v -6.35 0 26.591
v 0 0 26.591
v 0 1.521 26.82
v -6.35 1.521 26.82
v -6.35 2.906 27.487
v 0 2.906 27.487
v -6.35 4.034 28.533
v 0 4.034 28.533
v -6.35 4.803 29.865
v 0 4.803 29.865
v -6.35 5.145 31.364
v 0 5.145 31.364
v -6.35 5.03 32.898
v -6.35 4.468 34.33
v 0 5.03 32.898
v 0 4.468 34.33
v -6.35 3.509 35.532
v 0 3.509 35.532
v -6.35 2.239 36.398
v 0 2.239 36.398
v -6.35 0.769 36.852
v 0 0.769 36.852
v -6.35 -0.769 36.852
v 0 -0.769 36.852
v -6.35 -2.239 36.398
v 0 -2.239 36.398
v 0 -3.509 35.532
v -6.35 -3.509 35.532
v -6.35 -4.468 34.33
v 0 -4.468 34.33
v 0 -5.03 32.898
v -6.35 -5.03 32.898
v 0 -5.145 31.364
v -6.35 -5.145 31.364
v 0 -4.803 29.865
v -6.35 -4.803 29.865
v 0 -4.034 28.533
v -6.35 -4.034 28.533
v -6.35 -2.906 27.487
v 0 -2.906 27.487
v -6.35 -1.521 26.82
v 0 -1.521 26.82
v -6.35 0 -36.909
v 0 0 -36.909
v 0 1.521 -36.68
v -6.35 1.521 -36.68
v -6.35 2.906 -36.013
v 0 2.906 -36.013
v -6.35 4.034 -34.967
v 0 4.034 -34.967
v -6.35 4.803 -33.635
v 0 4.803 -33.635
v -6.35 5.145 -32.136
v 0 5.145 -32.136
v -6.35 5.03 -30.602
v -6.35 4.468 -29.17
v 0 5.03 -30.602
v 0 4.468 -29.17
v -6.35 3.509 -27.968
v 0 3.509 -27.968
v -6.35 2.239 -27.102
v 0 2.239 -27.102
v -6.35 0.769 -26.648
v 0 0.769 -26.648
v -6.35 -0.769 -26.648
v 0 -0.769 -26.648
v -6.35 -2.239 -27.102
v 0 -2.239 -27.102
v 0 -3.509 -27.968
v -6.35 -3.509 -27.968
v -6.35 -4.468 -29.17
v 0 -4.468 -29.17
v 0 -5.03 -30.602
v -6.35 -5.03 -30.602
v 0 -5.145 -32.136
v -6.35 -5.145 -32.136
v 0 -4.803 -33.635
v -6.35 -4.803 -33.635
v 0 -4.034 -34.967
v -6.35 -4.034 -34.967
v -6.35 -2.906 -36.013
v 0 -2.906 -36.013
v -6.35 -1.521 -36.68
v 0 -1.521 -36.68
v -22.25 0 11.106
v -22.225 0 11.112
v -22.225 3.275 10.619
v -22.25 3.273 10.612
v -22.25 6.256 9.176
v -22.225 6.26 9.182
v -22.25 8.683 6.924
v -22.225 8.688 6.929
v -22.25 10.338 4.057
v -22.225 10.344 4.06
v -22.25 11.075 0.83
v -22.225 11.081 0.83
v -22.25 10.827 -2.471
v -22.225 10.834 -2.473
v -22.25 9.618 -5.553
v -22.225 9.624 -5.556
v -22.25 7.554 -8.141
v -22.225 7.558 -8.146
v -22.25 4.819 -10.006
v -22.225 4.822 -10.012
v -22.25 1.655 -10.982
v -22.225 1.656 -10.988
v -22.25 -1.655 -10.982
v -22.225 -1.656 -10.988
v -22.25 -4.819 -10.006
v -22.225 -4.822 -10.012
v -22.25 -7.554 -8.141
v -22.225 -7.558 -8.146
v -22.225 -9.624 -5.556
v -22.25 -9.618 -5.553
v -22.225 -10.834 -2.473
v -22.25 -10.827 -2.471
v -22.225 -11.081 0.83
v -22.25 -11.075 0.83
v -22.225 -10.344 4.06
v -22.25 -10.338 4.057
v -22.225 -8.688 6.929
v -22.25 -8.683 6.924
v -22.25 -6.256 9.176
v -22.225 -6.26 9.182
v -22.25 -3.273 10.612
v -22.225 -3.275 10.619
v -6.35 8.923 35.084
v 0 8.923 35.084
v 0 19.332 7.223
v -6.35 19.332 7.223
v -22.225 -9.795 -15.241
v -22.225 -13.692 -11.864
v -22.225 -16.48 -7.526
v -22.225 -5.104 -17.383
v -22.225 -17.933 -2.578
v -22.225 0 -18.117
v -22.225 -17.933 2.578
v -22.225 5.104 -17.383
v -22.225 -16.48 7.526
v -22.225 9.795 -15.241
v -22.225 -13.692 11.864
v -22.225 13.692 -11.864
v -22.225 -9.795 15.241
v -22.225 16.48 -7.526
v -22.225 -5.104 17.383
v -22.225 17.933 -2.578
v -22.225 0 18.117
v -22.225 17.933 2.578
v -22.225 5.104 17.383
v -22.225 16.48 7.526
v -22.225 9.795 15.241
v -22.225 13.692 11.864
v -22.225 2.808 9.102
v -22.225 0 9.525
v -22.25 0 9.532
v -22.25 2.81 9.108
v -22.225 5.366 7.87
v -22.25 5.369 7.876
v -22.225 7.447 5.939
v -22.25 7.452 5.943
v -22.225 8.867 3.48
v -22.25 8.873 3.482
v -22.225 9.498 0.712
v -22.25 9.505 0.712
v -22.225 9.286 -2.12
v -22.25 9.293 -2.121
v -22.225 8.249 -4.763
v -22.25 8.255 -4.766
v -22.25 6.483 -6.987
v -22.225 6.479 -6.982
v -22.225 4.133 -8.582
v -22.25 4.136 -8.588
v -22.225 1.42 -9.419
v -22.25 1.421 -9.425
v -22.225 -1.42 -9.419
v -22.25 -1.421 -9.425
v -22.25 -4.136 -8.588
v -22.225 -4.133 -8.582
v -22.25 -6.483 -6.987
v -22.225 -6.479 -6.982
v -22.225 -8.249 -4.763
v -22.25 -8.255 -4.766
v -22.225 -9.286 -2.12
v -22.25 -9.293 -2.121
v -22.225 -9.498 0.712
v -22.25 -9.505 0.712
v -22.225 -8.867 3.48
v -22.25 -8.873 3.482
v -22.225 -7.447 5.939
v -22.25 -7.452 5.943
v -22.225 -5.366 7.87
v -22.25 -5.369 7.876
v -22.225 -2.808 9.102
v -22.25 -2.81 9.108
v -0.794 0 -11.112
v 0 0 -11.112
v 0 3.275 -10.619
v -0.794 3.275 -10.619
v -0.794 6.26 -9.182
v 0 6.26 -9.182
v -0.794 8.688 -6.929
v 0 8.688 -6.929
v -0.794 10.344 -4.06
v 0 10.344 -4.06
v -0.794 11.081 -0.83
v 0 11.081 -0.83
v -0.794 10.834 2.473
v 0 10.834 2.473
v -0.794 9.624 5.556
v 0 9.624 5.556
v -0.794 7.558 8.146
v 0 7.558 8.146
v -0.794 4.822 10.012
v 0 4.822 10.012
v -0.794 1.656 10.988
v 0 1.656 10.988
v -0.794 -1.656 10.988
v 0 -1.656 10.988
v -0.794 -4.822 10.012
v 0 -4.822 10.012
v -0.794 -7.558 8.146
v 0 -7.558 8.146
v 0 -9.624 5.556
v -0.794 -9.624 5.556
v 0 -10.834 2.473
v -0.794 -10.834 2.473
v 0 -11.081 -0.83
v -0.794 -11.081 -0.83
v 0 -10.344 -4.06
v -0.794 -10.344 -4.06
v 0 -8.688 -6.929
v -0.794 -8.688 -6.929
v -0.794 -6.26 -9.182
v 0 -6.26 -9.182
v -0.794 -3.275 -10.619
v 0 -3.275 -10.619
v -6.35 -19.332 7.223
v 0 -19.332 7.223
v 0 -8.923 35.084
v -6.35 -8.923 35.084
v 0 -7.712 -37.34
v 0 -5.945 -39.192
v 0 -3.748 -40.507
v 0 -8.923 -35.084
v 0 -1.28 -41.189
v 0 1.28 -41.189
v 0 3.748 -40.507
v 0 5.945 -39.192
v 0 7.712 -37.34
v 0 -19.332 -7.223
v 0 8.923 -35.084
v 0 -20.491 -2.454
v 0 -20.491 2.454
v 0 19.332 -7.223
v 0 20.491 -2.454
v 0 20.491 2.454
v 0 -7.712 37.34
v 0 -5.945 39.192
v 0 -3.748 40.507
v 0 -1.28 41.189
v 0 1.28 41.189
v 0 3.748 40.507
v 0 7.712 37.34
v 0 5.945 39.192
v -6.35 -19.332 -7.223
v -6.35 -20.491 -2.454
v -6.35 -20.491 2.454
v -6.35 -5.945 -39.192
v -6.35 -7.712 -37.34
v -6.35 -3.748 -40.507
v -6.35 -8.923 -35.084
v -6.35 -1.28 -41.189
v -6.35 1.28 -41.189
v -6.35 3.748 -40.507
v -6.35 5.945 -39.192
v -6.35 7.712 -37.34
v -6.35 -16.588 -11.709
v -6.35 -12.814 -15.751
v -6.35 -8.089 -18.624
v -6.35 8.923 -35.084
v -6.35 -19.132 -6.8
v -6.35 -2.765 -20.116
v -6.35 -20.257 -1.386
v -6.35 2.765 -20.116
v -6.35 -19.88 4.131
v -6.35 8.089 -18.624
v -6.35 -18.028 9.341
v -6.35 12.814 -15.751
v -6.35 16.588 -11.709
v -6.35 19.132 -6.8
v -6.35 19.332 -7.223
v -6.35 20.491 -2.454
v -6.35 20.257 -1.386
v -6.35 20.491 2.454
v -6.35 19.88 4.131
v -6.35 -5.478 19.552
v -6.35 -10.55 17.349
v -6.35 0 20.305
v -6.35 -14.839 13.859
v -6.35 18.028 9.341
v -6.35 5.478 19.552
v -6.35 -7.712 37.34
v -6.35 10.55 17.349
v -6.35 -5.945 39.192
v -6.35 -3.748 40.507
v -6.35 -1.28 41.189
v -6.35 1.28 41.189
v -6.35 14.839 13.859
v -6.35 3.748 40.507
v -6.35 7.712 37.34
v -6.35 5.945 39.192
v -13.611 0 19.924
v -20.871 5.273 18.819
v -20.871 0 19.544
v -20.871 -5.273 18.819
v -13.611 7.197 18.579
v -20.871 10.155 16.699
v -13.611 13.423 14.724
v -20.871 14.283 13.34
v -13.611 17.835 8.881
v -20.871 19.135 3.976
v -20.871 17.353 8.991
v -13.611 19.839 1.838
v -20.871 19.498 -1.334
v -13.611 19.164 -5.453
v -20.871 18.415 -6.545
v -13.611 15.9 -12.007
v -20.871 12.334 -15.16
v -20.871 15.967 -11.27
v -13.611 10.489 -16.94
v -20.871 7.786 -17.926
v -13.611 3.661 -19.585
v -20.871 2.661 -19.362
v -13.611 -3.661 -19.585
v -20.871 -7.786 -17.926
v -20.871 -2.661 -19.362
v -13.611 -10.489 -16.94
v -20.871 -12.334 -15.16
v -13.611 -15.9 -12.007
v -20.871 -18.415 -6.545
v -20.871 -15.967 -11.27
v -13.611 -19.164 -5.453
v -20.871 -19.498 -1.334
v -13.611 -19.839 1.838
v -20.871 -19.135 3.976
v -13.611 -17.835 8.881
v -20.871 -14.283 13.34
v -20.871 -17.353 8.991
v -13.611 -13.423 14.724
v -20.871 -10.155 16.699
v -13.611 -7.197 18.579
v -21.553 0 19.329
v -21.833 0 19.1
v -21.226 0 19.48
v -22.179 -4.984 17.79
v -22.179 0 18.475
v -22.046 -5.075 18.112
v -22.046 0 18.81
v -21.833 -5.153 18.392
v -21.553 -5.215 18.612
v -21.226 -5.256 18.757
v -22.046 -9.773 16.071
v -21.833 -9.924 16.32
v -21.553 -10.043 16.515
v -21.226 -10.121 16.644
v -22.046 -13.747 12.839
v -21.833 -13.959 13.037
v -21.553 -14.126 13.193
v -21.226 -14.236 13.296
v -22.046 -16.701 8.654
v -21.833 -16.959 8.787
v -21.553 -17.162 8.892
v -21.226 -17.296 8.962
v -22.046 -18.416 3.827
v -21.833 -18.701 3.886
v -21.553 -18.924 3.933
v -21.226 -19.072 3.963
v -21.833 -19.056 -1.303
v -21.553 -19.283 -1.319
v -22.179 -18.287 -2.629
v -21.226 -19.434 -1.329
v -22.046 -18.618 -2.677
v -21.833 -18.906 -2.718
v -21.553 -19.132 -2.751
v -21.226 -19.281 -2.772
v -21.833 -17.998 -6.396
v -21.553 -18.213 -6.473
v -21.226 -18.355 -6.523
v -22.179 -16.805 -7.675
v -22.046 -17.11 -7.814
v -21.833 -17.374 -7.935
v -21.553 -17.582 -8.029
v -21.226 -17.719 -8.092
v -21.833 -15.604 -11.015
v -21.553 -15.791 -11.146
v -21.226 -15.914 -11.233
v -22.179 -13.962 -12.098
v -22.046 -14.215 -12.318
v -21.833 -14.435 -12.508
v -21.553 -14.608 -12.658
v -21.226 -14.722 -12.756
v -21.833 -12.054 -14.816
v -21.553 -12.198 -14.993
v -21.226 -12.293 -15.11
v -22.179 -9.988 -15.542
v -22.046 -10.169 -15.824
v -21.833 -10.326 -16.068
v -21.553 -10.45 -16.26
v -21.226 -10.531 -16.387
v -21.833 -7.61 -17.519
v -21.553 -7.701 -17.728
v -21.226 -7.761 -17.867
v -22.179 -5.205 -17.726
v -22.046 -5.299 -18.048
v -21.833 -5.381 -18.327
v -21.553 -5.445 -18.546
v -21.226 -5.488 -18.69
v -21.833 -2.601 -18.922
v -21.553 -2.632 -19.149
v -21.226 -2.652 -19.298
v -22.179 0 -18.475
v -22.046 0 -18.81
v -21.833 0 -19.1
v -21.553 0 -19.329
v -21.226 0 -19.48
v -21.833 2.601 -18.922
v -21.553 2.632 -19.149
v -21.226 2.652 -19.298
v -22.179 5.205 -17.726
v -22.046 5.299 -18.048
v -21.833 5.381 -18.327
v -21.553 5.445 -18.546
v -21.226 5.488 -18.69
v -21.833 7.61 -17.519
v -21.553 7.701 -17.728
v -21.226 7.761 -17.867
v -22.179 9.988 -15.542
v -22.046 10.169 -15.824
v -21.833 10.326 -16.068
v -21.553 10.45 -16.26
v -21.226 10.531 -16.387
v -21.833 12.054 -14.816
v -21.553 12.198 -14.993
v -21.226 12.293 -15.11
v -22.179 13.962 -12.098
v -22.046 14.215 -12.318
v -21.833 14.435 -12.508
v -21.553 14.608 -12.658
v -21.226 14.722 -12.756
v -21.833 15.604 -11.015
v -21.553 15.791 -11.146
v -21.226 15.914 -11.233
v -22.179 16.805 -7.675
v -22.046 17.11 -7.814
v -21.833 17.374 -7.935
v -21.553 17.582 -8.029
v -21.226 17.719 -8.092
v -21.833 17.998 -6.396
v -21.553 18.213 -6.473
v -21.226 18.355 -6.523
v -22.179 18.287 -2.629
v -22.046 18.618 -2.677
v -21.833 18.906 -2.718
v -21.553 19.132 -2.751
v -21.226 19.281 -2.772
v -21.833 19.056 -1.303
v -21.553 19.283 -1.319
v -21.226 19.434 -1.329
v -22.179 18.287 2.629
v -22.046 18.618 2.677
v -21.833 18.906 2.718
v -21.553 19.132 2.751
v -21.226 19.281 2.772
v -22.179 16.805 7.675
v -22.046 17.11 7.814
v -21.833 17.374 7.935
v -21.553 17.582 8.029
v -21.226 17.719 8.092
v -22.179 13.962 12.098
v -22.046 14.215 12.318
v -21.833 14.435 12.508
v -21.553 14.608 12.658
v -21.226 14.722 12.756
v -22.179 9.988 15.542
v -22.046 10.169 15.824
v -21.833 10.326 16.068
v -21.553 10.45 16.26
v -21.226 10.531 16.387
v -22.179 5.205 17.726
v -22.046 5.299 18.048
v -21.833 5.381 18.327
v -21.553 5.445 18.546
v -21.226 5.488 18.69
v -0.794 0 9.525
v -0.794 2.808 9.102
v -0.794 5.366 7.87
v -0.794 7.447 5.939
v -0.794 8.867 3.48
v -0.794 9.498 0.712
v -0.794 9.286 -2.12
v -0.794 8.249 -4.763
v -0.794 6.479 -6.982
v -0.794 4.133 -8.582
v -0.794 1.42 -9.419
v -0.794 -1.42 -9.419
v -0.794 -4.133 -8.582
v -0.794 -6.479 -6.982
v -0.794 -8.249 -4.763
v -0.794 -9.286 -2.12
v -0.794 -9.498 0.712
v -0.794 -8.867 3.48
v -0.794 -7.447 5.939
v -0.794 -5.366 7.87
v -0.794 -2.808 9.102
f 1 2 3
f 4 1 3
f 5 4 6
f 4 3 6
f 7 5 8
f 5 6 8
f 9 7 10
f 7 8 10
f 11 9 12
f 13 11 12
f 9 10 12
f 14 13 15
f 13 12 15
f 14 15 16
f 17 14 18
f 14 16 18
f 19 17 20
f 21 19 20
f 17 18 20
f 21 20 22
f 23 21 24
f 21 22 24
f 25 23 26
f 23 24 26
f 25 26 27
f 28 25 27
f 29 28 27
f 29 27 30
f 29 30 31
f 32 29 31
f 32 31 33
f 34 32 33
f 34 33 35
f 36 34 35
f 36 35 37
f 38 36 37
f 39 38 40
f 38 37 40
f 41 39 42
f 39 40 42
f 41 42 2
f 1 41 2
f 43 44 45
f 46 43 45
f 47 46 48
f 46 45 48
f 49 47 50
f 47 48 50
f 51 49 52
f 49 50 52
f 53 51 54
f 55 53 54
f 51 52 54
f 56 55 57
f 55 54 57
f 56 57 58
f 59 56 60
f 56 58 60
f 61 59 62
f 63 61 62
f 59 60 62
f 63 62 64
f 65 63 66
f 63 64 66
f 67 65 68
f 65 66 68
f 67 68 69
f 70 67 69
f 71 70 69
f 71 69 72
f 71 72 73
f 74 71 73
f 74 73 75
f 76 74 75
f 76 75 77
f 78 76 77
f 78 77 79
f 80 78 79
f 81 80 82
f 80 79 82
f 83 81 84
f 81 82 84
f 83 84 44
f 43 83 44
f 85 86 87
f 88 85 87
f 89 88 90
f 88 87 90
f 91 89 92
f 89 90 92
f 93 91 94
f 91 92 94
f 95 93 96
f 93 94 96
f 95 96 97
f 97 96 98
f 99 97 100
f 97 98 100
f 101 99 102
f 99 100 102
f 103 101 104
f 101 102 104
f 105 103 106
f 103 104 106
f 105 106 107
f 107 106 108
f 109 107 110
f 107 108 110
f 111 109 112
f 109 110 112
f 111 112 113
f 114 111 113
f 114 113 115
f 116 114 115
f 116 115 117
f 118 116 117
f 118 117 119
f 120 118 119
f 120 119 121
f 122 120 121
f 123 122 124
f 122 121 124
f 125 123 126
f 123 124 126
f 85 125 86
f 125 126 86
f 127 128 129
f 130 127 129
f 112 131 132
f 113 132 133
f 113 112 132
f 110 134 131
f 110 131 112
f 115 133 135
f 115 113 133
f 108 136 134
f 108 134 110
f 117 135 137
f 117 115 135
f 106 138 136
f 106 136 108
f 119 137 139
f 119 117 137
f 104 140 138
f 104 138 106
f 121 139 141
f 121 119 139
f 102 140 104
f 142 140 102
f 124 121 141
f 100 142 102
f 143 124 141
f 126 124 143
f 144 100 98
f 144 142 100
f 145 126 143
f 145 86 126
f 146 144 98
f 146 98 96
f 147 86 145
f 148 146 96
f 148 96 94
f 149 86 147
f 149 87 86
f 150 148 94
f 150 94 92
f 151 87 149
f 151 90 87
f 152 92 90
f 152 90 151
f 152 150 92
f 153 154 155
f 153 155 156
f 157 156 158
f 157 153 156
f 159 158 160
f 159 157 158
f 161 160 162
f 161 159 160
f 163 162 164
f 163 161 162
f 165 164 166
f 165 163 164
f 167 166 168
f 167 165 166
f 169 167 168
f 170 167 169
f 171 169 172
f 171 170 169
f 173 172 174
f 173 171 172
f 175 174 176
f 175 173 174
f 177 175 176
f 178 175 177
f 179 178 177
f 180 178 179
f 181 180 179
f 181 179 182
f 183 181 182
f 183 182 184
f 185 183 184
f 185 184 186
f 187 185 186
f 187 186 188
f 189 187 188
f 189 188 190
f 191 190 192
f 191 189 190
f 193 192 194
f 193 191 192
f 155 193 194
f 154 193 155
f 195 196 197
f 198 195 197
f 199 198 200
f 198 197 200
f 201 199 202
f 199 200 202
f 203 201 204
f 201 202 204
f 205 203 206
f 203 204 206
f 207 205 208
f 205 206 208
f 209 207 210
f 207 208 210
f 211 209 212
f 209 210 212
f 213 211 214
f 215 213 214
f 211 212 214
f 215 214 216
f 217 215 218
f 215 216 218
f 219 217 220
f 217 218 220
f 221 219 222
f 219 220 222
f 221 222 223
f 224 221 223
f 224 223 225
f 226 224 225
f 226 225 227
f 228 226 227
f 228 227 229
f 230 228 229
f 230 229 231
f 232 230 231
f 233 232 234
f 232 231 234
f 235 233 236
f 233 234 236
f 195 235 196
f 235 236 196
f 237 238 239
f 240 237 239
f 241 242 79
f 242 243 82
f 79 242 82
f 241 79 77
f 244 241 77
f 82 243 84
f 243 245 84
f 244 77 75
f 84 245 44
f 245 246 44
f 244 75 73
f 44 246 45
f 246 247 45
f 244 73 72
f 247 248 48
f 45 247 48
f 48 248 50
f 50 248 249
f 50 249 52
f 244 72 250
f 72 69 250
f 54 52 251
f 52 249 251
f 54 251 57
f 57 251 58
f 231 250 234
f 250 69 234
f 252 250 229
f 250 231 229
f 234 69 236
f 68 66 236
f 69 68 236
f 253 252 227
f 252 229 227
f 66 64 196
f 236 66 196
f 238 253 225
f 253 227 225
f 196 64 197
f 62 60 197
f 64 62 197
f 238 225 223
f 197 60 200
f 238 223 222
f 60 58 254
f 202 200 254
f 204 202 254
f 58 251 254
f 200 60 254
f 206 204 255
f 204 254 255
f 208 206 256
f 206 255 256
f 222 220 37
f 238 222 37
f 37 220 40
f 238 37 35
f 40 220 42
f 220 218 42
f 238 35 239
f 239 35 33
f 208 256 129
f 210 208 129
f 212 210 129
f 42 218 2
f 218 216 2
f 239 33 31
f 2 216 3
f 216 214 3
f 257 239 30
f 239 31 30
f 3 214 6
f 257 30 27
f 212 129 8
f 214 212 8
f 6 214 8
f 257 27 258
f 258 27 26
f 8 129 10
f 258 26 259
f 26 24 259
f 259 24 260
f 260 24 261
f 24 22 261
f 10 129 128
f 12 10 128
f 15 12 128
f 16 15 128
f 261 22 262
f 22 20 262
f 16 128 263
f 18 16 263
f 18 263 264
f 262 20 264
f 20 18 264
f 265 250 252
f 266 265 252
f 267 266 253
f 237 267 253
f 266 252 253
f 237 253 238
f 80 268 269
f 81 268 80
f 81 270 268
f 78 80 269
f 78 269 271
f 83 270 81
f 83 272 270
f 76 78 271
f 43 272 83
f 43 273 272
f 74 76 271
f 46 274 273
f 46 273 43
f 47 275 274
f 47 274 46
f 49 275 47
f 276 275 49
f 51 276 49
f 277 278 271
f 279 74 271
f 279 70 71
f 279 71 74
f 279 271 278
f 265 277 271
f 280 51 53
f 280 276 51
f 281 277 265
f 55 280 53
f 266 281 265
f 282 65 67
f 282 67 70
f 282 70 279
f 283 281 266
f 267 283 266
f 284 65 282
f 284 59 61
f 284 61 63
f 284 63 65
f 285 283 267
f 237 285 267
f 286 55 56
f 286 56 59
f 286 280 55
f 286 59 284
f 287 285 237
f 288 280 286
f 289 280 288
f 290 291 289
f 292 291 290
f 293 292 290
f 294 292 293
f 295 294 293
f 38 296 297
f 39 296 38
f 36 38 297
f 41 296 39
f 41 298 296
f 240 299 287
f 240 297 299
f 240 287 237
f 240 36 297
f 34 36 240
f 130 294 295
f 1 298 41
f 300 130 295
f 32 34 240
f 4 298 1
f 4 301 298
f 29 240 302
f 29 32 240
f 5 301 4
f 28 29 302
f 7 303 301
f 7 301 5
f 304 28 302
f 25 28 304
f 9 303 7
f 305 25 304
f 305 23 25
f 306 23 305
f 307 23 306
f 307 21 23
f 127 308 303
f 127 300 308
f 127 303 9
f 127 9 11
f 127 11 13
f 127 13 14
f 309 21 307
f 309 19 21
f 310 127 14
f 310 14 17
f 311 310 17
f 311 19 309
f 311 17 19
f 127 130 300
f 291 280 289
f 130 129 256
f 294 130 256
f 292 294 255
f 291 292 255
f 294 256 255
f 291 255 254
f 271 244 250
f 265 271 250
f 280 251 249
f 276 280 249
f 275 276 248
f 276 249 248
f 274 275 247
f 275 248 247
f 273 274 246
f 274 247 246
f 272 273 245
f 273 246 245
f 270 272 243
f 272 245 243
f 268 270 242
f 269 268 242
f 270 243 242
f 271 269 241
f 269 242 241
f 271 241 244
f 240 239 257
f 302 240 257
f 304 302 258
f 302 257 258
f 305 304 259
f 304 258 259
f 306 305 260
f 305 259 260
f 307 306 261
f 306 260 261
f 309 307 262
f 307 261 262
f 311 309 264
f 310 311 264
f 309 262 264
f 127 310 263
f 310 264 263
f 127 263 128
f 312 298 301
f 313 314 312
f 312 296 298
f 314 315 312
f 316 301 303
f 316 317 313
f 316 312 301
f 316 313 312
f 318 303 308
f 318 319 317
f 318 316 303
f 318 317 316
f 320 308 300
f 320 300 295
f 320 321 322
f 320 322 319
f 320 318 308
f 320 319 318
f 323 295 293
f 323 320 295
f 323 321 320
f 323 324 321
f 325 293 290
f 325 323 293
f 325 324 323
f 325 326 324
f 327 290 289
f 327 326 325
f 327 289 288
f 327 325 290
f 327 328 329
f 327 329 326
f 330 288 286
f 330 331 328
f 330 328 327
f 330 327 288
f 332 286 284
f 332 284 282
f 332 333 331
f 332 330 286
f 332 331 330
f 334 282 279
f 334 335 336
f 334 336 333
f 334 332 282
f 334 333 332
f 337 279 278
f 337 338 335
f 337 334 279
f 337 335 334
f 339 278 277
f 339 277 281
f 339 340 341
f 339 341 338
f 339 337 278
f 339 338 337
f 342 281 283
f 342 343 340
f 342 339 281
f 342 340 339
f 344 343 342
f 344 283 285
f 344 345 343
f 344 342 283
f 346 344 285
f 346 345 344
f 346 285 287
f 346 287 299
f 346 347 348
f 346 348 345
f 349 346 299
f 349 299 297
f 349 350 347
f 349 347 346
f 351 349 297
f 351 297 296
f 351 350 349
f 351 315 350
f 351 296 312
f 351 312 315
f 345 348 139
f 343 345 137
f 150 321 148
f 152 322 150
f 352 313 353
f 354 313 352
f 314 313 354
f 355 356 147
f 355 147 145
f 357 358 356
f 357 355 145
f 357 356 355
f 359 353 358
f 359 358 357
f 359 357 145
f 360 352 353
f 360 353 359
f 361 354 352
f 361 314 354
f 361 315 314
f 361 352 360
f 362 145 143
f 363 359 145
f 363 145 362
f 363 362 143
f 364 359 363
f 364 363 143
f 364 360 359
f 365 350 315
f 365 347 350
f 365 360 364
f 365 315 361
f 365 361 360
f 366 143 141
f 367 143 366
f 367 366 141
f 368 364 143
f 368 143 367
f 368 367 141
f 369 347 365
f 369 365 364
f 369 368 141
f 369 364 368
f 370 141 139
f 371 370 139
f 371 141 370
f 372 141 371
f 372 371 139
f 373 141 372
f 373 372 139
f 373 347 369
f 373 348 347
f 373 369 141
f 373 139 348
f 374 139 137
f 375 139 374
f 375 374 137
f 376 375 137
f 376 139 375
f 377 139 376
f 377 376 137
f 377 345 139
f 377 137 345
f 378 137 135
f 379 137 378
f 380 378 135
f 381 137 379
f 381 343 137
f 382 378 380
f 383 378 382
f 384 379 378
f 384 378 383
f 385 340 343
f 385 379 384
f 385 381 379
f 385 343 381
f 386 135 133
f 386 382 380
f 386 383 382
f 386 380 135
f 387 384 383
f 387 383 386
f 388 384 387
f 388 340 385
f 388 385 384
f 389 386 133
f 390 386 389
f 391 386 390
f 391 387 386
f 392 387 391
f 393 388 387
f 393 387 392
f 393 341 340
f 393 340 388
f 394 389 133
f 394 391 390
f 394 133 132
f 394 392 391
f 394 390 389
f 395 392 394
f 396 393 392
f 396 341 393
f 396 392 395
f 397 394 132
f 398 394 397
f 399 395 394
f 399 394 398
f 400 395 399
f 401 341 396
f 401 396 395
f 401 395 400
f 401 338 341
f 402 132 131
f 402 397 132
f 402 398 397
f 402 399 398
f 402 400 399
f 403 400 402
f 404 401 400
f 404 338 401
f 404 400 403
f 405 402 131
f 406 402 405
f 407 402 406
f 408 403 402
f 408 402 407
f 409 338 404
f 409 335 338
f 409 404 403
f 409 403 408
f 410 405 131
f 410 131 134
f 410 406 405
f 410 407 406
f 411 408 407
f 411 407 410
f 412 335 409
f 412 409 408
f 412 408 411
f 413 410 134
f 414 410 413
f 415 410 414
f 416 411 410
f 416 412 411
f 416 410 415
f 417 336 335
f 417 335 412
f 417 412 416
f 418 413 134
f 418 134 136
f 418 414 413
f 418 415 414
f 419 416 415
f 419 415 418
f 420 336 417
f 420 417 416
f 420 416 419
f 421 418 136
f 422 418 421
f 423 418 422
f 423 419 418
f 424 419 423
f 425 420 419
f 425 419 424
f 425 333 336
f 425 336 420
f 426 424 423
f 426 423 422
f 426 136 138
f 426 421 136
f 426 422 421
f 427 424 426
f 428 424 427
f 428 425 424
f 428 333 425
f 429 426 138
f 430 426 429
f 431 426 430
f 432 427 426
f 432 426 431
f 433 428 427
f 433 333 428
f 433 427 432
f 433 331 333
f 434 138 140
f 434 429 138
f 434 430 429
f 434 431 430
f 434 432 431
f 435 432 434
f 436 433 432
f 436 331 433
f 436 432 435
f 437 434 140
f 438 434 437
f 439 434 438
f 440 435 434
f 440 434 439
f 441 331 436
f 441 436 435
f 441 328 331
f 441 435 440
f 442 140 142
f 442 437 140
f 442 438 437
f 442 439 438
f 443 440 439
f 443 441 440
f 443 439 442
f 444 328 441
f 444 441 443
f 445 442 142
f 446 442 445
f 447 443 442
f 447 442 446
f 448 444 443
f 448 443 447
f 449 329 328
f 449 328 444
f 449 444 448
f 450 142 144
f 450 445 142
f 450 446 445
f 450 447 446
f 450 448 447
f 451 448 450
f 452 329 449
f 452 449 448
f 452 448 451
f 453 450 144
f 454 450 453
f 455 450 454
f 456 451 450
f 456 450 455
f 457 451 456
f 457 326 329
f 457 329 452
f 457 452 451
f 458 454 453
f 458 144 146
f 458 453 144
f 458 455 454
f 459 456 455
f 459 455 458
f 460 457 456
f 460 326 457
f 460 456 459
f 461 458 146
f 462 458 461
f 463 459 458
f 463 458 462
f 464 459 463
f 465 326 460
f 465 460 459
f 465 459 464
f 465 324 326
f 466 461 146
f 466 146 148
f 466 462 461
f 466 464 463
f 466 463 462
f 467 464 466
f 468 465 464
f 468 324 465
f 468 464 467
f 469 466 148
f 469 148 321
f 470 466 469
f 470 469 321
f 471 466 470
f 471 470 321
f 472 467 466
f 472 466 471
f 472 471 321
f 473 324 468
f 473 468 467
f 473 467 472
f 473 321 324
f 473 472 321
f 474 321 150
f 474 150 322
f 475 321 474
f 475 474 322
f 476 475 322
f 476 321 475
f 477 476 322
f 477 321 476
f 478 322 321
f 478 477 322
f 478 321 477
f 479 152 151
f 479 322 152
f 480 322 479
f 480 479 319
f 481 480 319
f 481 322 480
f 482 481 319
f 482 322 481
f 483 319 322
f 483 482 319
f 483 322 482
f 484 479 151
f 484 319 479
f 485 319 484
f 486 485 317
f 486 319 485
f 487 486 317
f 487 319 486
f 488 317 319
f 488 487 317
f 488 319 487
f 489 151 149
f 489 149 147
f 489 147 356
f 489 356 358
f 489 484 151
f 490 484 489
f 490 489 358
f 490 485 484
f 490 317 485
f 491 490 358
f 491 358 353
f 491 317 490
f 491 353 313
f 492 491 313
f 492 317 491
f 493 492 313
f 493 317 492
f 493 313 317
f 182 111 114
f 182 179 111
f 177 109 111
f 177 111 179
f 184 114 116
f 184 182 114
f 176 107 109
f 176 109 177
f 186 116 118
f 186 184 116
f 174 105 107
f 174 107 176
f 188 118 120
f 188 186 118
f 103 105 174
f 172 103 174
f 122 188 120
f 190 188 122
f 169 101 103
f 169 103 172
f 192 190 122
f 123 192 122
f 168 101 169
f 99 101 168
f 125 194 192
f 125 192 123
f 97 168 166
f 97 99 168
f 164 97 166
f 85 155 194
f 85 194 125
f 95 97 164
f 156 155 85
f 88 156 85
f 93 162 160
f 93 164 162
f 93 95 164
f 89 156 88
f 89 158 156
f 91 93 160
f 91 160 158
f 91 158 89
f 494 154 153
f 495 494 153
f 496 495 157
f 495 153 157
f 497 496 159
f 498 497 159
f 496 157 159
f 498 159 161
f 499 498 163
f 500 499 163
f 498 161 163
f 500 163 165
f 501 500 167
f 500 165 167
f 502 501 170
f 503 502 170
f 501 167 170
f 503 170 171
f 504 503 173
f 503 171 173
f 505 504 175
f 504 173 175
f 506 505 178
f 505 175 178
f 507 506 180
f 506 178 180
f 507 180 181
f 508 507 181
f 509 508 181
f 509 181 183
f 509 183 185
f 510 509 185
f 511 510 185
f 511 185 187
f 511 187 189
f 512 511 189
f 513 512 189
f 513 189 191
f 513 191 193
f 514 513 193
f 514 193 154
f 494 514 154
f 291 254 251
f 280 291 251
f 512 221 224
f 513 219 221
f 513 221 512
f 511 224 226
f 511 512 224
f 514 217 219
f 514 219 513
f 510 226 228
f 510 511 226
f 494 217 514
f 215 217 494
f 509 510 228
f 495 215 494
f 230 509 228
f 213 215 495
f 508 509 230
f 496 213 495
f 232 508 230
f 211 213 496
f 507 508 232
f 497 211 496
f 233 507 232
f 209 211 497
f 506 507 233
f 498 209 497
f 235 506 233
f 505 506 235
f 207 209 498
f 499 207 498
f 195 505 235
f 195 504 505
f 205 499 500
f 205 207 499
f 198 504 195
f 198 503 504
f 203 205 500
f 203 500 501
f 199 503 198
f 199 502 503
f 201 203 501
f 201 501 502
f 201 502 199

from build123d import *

# Parameters (mm, degrees)
SKETCH1_R           = 5.159375
BASE_EXTRUDE_DEPTH  = 6.35
SKETCH2_R           = 20.6375
BOSS_EXTRUDE1_DEPTH = 22.225
BOSS_EXTRUDE1_TAPER = 3
SKETCH3_R           = 9.525
CUT_EXTRUDE1_DEPTH  = 52.219943931
SKETCH4_R           = 11.1125
SKETCH4_R_2         = 9.525
BOSS_EXTRUDE2_DEPTH = 0.0254
BOSS_EXTRUDE2_DRAFT = 15
SKETCH5_R           = 11.1125
CUT_EXTRUDE2_DEPTH  = 0.79375
FILLET1_R           = 1.42875


with BuildPart() as part:
    # Sketch1 → Base-Extrude (new body)
    with BuildSketch(Plane(origin=(0, 0, 0), x_dir=(0, 0, -1), z_dir=(1, 0, 0))):
        with BuildLine():
            Line((-7.223125, -19.332171929), (-35.08375, -8.92254089))
            ThreePointArc((-35.08375, -8.92254089), (-41.275, 0), (-35.08375, 8.92254089))
            Line((-35.08375, 8.92254089), (-7.223125, 19.332171929))
            ThreePointArc((-7.223125, 19.332171929), (0, 20.6375), (7.223125, 19.332171929))
            Line((7.223125, 19.332171929), (35.08375, 8.92254089))
            ThreePointArc((35.08375, 8.92254089), (41.275, 0), (35.08375, -8.92254089))
            Line((35.08375, -8.92254089), (7.223125, -19.332171929))
            ThreePointArc((7.223125, -19.332171929), (0, -20.6375), (-7.223125, -19.332171929))
        make_face()
        with Locations((-31.75, 0)):
            Circle(SKETCH1_R, mode=Mode.SUBTRACT)
        with Locations((31.75, 0)):
            Circle(SKETCH1_R, mode=Mode.SUBTRACT)
    extrude(amount=-BASE_EXTRUDE_DEPTH)

    # Sketch2 → Boss-Extrude1 (add)
    with BuildSketch(Plane.ZY):
        Circle(SKETCH2_R)
    extrude(amount=BOSS_EXTRUDE1_DEPTH, taper=BOSS_EXTRUDE1_TAPER)

    # Sketch3 → Cut-Extrude1 (cut, through all)
    with BuildSketch(Plane.ZY.offset(22.225)):
        Circle(SKETCH3_R)
    extrude(amount=-CUT_EXTRUDE1_DEPTH, mode=Mode.SUBTRACT)


with BuildPart() as boss_extrude2_tool:
    # Sketch4 → Boss-Extrude2 (with draft: the straight prism first)
    with BuildSketch(Plane.ZY.offset(22.225)):
        Circle(SKETCH4_R)
        Circle(SKETCH4_R_2, mode=Mode.SUBTRACT)
    extrude(amount=BOSS_EXTRUDE2_DEPTH)
    # Boss-Extrude2: the draft: its side faces are tilted about the plane it starts from
    boss_extrude2_sides = [boss_extrude2_tool.faces().sort_by_distance(p)[0] for p in [
        (-22.2377, 0, -11.1125),
        (-22.2377, 0, -9.525),
    ]]
    draft(boss_extrude2_sides, Plane.ZY.offset(22.225), BOSS_EXTRUDE2_DRAFT)


with BuildPart() as part_1:
    add(part.part)

    # Boss-Extrude2: add boss_extrude2_tool
    add(boss_extrude2_tool.part)

    # Sketch5 → Cut-Extrude2 (cut)
    with BuildSketch(Plane(origin=(0, 0, 0), x_dir=(0, 0, -1), z_dir=(1, 0, 0))):
        Circle(SKETCH5_R)
    extrude(amount=-CUT_EXTRUDE2_DEPTH, mode=Mode.SUBTRACT)

    # Fillet1
    fillet1_edges = [part_1.edges().sort_by_distance(p)[0] for p in [
        (-22.225, 0, -19.472737105),
    ]]
    fillet(fillet1_edges, radius=FILLET1_R)


solid = part_1.part
